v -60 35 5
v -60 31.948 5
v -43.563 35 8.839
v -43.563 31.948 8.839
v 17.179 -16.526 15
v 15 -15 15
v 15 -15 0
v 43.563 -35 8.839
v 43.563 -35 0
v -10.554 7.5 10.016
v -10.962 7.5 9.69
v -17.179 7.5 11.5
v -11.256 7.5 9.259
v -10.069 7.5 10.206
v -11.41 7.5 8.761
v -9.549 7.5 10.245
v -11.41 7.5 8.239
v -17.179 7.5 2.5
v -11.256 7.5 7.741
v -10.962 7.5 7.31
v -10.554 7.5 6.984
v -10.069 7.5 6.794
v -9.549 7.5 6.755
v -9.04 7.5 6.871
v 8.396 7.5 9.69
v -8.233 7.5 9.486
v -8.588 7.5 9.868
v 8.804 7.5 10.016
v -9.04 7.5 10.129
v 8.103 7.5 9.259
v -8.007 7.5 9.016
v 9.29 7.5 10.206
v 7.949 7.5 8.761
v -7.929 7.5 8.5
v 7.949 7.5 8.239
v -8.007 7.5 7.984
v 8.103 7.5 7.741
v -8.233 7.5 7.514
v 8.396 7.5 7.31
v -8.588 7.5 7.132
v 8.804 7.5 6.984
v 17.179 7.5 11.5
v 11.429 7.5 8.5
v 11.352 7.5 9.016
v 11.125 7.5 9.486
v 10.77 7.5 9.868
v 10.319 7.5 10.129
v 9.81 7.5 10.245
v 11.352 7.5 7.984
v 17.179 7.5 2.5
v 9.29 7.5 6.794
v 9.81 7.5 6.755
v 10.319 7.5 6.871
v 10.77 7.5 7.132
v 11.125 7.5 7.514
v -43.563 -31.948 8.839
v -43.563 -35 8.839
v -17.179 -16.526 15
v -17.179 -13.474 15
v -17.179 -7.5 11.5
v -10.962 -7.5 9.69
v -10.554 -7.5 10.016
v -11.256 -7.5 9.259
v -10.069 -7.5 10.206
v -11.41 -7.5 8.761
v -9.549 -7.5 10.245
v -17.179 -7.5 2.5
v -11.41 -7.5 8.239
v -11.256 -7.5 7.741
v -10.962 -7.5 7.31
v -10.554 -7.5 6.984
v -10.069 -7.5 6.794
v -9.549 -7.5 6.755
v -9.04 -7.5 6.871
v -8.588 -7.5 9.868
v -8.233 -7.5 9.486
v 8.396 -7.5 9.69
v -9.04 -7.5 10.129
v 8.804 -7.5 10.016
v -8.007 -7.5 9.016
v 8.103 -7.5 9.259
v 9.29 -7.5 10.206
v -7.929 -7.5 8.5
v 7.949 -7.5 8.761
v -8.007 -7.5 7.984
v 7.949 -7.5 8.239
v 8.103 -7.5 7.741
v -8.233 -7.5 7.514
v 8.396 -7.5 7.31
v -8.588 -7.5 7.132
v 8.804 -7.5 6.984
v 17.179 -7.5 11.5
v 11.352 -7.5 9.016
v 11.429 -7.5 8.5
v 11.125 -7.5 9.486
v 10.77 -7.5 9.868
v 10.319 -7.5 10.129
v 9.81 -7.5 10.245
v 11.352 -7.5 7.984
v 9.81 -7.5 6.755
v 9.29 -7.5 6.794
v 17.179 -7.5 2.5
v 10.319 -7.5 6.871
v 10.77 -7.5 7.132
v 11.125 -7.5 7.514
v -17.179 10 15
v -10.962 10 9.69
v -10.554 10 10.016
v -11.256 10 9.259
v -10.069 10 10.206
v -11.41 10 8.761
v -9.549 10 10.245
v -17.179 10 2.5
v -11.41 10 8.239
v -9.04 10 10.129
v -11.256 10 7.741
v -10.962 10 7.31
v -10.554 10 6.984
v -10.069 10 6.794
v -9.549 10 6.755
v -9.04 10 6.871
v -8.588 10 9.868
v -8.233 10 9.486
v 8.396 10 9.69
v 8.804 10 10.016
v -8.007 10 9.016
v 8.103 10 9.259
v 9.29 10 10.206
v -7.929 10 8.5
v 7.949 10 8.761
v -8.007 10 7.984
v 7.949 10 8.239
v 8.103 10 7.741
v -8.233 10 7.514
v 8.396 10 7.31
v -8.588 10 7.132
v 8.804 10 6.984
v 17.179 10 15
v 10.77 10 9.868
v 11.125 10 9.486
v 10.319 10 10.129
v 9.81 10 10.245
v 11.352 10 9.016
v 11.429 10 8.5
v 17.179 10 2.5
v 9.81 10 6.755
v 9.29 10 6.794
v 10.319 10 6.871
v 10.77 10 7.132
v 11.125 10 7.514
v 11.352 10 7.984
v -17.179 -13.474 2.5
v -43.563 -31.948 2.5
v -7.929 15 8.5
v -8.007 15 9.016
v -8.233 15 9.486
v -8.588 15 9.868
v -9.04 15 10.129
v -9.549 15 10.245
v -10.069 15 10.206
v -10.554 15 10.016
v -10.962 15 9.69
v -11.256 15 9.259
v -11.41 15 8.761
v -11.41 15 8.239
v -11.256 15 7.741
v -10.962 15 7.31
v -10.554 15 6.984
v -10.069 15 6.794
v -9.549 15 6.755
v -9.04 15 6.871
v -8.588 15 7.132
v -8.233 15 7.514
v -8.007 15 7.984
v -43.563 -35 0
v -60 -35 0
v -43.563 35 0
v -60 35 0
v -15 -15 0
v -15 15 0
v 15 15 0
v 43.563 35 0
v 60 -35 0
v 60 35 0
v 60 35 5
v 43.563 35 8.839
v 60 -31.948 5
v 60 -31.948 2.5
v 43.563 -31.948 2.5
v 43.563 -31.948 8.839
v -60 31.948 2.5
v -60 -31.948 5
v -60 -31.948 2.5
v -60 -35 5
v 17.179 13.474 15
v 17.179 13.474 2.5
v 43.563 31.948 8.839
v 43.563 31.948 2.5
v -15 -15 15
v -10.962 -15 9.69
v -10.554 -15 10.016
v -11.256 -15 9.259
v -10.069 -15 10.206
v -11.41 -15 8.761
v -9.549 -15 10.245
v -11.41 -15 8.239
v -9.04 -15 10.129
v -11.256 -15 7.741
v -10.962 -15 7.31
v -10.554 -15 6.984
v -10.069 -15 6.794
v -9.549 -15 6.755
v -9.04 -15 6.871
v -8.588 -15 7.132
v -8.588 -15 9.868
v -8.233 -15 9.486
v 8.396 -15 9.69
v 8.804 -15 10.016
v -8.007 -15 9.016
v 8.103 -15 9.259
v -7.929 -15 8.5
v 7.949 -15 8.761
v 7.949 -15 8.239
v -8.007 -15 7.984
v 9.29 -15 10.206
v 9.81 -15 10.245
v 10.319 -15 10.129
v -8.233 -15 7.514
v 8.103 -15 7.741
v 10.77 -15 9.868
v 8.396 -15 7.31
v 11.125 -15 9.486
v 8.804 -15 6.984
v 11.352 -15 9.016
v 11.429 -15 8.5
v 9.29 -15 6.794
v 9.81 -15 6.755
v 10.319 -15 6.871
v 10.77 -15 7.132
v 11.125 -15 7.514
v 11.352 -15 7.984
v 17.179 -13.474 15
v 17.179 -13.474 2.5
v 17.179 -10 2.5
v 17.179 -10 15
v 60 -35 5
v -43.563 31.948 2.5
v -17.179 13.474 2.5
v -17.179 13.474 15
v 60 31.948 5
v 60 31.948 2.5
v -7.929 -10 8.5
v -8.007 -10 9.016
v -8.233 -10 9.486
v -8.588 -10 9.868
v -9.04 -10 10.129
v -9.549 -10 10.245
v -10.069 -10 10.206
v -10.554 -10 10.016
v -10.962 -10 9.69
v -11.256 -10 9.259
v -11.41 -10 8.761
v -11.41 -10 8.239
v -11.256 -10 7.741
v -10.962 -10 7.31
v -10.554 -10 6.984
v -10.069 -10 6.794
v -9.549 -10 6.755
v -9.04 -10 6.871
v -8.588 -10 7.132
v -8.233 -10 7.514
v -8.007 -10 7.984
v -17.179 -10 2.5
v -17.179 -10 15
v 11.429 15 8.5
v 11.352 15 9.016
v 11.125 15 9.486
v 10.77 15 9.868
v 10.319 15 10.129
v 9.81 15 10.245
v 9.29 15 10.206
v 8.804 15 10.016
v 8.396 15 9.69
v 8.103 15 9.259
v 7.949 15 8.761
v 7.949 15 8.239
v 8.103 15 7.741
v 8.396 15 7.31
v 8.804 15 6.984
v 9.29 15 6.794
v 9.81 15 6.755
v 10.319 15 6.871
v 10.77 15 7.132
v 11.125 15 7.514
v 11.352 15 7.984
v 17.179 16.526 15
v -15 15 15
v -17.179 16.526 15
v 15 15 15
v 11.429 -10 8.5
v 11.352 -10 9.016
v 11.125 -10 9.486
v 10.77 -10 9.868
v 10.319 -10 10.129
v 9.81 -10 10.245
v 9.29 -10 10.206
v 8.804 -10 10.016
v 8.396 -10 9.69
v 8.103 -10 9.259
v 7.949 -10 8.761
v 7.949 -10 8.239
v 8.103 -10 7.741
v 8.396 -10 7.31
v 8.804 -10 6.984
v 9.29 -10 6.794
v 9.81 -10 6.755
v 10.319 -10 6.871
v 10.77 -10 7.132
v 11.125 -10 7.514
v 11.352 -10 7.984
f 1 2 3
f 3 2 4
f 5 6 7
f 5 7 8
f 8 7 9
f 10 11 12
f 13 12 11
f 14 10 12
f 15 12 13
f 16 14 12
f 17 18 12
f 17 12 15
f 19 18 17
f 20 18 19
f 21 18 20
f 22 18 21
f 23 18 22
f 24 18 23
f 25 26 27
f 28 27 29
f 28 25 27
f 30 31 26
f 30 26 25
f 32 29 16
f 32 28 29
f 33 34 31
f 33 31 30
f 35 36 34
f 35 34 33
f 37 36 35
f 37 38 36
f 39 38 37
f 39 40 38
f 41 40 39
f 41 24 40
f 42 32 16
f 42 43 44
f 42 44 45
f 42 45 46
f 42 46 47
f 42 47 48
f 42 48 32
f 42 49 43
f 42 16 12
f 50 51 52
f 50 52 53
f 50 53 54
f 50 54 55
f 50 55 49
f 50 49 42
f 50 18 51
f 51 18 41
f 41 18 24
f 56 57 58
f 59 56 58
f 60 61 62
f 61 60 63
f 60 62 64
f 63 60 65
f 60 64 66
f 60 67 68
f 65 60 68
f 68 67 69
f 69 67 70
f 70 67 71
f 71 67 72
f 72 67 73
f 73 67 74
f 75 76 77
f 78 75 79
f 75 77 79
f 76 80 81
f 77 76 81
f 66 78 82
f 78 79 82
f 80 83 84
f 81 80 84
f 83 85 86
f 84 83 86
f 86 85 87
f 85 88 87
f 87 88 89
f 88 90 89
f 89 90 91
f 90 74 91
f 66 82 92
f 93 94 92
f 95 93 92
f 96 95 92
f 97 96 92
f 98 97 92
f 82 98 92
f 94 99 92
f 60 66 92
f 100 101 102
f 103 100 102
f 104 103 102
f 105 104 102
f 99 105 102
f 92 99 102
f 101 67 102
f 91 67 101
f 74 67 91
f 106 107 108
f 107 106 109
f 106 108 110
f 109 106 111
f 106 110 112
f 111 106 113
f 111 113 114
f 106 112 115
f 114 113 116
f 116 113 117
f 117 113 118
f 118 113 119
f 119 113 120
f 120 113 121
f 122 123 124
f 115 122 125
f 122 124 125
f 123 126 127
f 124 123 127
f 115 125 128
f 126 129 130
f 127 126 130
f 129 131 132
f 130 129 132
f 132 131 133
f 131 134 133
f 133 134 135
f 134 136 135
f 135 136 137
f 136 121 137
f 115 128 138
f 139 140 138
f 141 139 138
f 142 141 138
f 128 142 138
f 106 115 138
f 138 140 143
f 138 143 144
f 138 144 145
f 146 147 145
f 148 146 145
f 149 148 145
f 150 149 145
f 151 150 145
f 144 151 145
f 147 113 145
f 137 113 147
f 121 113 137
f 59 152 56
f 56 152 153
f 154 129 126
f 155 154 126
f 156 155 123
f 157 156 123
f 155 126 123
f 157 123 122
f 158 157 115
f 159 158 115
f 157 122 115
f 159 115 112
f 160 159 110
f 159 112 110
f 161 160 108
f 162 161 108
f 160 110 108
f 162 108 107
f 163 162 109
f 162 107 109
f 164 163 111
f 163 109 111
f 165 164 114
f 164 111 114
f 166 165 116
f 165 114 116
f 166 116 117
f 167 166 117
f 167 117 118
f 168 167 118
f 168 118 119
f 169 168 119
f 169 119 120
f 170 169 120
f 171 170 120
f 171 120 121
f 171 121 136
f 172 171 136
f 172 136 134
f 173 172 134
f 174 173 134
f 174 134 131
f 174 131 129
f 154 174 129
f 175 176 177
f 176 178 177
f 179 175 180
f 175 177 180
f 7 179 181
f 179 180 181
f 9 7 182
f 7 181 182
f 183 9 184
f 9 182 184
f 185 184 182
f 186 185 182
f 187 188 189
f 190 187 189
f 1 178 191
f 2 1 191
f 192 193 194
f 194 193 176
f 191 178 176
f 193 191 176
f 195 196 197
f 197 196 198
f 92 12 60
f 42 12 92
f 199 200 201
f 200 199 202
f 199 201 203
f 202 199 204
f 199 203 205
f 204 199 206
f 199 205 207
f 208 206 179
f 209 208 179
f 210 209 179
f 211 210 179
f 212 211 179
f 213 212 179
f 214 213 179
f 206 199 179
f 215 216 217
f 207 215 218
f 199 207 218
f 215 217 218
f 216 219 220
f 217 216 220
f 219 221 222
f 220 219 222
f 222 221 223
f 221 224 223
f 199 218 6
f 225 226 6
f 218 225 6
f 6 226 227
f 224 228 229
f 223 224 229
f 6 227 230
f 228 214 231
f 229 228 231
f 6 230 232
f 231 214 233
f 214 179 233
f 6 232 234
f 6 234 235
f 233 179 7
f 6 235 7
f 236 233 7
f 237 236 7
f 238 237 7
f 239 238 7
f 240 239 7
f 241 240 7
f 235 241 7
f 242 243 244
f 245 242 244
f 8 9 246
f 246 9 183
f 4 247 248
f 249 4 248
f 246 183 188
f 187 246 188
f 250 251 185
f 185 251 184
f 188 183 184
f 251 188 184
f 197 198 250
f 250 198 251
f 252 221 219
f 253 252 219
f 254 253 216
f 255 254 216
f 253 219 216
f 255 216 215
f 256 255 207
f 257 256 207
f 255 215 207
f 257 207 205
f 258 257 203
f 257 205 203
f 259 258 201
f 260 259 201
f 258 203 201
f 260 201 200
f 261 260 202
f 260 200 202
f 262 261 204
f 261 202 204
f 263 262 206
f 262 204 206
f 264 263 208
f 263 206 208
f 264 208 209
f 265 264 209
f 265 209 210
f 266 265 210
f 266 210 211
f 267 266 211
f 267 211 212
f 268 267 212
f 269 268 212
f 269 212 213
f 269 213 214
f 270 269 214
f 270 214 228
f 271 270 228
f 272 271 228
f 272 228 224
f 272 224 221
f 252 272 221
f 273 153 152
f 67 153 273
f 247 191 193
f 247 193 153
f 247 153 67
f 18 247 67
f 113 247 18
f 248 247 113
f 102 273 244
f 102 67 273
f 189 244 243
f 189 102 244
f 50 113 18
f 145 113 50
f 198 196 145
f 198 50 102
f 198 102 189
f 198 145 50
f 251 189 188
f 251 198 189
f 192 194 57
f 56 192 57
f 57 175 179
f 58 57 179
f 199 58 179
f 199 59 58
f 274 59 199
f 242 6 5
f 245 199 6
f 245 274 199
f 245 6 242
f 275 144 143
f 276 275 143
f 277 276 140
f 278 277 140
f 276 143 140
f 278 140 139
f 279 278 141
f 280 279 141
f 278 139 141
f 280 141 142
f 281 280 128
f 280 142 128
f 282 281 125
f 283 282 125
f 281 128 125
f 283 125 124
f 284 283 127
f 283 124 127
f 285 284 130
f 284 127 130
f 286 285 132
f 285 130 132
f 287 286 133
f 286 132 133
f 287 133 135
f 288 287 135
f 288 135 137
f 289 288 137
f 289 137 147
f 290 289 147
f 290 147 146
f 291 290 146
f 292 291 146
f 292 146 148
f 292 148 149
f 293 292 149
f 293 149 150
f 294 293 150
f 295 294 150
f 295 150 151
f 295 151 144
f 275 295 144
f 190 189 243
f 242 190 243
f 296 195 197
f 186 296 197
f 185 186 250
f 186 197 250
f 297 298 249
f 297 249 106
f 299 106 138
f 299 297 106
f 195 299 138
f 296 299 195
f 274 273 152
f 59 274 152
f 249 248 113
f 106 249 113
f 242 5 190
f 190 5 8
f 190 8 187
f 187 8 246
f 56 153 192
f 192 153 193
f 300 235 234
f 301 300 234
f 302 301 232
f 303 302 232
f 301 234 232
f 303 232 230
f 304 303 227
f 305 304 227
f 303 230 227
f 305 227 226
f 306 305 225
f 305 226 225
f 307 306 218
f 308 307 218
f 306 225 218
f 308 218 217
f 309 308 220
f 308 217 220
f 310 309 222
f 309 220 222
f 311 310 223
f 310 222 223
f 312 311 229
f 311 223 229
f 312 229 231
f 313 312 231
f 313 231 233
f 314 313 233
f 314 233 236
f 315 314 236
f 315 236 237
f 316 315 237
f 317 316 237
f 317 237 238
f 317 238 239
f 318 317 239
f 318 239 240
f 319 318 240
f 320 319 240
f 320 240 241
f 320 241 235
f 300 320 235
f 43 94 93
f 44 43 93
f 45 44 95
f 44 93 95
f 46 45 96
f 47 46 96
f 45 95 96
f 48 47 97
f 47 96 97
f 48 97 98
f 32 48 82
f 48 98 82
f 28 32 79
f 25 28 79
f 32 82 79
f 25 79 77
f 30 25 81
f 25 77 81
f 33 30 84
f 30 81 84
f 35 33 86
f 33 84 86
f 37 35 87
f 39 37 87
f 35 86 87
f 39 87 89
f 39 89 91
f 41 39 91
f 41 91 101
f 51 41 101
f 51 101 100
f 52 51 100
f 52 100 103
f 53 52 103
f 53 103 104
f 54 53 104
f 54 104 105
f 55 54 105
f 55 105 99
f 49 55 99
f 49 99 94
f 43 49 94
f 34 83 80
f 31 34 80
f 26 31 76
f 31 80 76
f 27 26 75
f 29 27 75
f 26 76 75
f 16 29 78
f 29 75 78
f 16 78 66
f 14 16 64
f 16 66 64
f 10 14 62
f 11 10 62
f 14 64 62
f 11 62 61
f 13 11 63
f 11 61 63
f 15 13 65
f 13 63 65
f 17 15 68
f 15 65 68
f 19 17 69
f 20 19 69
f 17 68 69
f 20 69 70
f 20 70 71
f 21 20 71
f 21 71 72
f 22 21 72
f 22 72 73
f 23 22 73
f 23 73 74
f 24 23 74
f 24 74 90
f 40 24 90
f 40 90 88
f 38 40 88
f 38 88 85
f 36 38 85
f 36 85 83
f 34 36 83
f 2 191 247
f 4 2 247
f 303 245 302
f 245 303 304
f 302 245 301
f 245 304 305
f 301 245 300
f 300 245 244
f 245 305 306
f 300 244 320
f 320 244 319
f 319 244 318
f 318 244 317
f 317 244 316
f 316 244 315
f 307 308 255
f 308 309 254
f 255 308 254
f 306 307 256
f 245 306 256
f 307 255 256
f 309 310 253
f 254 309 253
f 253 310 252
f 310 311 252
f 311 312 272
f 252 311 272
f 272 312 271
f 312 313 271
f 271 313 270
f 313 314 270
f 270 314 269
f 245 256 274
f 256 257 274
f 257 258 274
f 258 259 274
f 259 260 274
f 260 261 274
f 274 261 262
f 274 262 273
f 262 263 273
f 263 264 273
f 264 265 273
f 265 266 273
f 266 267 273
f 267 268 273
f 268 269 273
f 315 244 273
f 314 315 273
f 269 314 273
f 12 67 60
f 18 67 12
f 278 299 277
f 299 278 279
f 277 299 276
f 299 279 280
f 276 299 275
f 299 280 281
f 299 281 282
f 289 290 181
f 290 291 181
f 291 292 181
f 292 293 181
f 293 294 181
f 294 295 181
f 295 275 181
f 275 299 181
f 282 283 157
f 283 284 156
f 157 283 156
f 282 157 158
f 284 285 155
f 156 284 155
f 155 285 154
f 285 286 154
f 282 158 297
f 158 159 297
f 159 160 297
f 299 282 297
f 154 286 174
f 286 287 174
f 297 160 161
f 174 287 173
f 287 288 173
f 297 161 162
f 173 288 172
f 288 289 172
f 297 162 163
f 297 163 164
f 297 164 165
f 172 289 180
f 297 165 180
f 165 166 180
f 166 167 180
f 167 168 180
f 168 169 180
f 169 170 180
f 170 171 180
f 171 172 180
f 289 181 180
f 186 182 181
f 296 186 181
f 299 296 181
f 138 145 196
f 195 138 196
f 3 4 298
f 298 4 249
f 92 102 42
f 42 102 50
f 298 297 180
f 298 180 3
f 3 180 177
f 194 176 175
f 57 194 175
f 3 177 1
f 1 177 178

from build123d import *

# Parameters (mm, degrees)
F0_W     = 34.3586169891
F0_H     = 15
F1_DEPTH = 11.5
F2_DEPTH = 2.5
F3_DEPTH = 15
F5_DEPTH = 70
F6_R     = 1.75
F7_DEPTH = 50.001


with BuildPart() as f1:
    # F0 (on Top) → F1 (new body)
    with BuildSketch(Plane.XY):
        Rectangle(F0_W, F0_H)
    extrude(amount=F1_DEPTH)

    # F0 (on Top) → F2 (join)
    with BuildSketch(Plane.XY):
        Polygon((-43.5629601348, 31.9480635281), (-60, 31.9480635281), (-60, -31.9480635281), (-43.5629601348, -31.9480635281), (-17.1793084945, -13.474031764), (-17.1793084945, -10), (17.1793084945, -10), (17.1793084945, -13.474031764), (43.5629601348, -31.9480635281), (60, -31.9480635281), (60, 31.9480635281), (43.5629601348, 31.9480635281), (17.1793084945, 13.474031764), (17.1793084945, 10), (-17.1793084945, 10), (-17.1793084945, 13.474031764), align=None)
        Rectangle(F0_W, F0_H, mode=Mode.SUBTRACT)
    extrude(amount=F2_DEPTH)

    # F0 (on Top) → F3 (join)
    with BuildSketch(Plane.XY):
        Polygon((-43.5629601348, -31.9480635281), (-60, -31.9480635281), (-60, -35), (-43.5629601348, -35), (-15, -15), (15, -15), (43.5629601348, -35), (60, -35), (60, -31.9480635281), (43.5629601348, -31.9480635281), (17.1793084945, -13.474031764), (17.1793084945, -10), (-17.1793084945, -10), (-17.1793084945, -13.474031764), align=None)
        Polygon((15, 15), (-15, 15), (-43.5629601348, 35), (-60, 35), (-60, 31.9480635281), (-43.5629601348, 31.9480635281), (-17.1793084945, 13.474031764), (-17.1793084945, 10), (17.1793084945, 10), (17.1793084945, 13.474031764), (43.5629601348, 31.9480635281), (60, 31.9480635281), (60, 35), (43.5629601348, 35), align=None)
    extrude(amount=F3_DEPTH)

    # F4 (on face) → F5 (cut, through all)
    with BuildSketch(Plane.XZ.offset(35)):
        Polygon((-60, 15), (-60, 5), (-43.5629601348, 8.8385741302), (-43.5629601348, 15), align=None)
        Polygon((-43.5629601348, 15), (-43.5629601348, 8.8385741302), (-17.1793084945, 15), align=None)
        Polygon((17.1793084945, 15), (60, 5), (60, 15), align=None)
    extrude(amount=-F5_DEPTH, mode=Mode.SUBTRACT)

    # F6 (on face) → F7 (cut, through all)
    with BuildSketch(Plane.XZ.offset(15)):
        with Locations((-9.6793084945, 8.5)):
            Circle(F6_R)
        with Locations((9.6793084945, 8.5)):
            Circle(F6_R)
    extrude(amount=-F7_DEPTH, mode=Mode.SUBTRACT)


solid = f1.part
